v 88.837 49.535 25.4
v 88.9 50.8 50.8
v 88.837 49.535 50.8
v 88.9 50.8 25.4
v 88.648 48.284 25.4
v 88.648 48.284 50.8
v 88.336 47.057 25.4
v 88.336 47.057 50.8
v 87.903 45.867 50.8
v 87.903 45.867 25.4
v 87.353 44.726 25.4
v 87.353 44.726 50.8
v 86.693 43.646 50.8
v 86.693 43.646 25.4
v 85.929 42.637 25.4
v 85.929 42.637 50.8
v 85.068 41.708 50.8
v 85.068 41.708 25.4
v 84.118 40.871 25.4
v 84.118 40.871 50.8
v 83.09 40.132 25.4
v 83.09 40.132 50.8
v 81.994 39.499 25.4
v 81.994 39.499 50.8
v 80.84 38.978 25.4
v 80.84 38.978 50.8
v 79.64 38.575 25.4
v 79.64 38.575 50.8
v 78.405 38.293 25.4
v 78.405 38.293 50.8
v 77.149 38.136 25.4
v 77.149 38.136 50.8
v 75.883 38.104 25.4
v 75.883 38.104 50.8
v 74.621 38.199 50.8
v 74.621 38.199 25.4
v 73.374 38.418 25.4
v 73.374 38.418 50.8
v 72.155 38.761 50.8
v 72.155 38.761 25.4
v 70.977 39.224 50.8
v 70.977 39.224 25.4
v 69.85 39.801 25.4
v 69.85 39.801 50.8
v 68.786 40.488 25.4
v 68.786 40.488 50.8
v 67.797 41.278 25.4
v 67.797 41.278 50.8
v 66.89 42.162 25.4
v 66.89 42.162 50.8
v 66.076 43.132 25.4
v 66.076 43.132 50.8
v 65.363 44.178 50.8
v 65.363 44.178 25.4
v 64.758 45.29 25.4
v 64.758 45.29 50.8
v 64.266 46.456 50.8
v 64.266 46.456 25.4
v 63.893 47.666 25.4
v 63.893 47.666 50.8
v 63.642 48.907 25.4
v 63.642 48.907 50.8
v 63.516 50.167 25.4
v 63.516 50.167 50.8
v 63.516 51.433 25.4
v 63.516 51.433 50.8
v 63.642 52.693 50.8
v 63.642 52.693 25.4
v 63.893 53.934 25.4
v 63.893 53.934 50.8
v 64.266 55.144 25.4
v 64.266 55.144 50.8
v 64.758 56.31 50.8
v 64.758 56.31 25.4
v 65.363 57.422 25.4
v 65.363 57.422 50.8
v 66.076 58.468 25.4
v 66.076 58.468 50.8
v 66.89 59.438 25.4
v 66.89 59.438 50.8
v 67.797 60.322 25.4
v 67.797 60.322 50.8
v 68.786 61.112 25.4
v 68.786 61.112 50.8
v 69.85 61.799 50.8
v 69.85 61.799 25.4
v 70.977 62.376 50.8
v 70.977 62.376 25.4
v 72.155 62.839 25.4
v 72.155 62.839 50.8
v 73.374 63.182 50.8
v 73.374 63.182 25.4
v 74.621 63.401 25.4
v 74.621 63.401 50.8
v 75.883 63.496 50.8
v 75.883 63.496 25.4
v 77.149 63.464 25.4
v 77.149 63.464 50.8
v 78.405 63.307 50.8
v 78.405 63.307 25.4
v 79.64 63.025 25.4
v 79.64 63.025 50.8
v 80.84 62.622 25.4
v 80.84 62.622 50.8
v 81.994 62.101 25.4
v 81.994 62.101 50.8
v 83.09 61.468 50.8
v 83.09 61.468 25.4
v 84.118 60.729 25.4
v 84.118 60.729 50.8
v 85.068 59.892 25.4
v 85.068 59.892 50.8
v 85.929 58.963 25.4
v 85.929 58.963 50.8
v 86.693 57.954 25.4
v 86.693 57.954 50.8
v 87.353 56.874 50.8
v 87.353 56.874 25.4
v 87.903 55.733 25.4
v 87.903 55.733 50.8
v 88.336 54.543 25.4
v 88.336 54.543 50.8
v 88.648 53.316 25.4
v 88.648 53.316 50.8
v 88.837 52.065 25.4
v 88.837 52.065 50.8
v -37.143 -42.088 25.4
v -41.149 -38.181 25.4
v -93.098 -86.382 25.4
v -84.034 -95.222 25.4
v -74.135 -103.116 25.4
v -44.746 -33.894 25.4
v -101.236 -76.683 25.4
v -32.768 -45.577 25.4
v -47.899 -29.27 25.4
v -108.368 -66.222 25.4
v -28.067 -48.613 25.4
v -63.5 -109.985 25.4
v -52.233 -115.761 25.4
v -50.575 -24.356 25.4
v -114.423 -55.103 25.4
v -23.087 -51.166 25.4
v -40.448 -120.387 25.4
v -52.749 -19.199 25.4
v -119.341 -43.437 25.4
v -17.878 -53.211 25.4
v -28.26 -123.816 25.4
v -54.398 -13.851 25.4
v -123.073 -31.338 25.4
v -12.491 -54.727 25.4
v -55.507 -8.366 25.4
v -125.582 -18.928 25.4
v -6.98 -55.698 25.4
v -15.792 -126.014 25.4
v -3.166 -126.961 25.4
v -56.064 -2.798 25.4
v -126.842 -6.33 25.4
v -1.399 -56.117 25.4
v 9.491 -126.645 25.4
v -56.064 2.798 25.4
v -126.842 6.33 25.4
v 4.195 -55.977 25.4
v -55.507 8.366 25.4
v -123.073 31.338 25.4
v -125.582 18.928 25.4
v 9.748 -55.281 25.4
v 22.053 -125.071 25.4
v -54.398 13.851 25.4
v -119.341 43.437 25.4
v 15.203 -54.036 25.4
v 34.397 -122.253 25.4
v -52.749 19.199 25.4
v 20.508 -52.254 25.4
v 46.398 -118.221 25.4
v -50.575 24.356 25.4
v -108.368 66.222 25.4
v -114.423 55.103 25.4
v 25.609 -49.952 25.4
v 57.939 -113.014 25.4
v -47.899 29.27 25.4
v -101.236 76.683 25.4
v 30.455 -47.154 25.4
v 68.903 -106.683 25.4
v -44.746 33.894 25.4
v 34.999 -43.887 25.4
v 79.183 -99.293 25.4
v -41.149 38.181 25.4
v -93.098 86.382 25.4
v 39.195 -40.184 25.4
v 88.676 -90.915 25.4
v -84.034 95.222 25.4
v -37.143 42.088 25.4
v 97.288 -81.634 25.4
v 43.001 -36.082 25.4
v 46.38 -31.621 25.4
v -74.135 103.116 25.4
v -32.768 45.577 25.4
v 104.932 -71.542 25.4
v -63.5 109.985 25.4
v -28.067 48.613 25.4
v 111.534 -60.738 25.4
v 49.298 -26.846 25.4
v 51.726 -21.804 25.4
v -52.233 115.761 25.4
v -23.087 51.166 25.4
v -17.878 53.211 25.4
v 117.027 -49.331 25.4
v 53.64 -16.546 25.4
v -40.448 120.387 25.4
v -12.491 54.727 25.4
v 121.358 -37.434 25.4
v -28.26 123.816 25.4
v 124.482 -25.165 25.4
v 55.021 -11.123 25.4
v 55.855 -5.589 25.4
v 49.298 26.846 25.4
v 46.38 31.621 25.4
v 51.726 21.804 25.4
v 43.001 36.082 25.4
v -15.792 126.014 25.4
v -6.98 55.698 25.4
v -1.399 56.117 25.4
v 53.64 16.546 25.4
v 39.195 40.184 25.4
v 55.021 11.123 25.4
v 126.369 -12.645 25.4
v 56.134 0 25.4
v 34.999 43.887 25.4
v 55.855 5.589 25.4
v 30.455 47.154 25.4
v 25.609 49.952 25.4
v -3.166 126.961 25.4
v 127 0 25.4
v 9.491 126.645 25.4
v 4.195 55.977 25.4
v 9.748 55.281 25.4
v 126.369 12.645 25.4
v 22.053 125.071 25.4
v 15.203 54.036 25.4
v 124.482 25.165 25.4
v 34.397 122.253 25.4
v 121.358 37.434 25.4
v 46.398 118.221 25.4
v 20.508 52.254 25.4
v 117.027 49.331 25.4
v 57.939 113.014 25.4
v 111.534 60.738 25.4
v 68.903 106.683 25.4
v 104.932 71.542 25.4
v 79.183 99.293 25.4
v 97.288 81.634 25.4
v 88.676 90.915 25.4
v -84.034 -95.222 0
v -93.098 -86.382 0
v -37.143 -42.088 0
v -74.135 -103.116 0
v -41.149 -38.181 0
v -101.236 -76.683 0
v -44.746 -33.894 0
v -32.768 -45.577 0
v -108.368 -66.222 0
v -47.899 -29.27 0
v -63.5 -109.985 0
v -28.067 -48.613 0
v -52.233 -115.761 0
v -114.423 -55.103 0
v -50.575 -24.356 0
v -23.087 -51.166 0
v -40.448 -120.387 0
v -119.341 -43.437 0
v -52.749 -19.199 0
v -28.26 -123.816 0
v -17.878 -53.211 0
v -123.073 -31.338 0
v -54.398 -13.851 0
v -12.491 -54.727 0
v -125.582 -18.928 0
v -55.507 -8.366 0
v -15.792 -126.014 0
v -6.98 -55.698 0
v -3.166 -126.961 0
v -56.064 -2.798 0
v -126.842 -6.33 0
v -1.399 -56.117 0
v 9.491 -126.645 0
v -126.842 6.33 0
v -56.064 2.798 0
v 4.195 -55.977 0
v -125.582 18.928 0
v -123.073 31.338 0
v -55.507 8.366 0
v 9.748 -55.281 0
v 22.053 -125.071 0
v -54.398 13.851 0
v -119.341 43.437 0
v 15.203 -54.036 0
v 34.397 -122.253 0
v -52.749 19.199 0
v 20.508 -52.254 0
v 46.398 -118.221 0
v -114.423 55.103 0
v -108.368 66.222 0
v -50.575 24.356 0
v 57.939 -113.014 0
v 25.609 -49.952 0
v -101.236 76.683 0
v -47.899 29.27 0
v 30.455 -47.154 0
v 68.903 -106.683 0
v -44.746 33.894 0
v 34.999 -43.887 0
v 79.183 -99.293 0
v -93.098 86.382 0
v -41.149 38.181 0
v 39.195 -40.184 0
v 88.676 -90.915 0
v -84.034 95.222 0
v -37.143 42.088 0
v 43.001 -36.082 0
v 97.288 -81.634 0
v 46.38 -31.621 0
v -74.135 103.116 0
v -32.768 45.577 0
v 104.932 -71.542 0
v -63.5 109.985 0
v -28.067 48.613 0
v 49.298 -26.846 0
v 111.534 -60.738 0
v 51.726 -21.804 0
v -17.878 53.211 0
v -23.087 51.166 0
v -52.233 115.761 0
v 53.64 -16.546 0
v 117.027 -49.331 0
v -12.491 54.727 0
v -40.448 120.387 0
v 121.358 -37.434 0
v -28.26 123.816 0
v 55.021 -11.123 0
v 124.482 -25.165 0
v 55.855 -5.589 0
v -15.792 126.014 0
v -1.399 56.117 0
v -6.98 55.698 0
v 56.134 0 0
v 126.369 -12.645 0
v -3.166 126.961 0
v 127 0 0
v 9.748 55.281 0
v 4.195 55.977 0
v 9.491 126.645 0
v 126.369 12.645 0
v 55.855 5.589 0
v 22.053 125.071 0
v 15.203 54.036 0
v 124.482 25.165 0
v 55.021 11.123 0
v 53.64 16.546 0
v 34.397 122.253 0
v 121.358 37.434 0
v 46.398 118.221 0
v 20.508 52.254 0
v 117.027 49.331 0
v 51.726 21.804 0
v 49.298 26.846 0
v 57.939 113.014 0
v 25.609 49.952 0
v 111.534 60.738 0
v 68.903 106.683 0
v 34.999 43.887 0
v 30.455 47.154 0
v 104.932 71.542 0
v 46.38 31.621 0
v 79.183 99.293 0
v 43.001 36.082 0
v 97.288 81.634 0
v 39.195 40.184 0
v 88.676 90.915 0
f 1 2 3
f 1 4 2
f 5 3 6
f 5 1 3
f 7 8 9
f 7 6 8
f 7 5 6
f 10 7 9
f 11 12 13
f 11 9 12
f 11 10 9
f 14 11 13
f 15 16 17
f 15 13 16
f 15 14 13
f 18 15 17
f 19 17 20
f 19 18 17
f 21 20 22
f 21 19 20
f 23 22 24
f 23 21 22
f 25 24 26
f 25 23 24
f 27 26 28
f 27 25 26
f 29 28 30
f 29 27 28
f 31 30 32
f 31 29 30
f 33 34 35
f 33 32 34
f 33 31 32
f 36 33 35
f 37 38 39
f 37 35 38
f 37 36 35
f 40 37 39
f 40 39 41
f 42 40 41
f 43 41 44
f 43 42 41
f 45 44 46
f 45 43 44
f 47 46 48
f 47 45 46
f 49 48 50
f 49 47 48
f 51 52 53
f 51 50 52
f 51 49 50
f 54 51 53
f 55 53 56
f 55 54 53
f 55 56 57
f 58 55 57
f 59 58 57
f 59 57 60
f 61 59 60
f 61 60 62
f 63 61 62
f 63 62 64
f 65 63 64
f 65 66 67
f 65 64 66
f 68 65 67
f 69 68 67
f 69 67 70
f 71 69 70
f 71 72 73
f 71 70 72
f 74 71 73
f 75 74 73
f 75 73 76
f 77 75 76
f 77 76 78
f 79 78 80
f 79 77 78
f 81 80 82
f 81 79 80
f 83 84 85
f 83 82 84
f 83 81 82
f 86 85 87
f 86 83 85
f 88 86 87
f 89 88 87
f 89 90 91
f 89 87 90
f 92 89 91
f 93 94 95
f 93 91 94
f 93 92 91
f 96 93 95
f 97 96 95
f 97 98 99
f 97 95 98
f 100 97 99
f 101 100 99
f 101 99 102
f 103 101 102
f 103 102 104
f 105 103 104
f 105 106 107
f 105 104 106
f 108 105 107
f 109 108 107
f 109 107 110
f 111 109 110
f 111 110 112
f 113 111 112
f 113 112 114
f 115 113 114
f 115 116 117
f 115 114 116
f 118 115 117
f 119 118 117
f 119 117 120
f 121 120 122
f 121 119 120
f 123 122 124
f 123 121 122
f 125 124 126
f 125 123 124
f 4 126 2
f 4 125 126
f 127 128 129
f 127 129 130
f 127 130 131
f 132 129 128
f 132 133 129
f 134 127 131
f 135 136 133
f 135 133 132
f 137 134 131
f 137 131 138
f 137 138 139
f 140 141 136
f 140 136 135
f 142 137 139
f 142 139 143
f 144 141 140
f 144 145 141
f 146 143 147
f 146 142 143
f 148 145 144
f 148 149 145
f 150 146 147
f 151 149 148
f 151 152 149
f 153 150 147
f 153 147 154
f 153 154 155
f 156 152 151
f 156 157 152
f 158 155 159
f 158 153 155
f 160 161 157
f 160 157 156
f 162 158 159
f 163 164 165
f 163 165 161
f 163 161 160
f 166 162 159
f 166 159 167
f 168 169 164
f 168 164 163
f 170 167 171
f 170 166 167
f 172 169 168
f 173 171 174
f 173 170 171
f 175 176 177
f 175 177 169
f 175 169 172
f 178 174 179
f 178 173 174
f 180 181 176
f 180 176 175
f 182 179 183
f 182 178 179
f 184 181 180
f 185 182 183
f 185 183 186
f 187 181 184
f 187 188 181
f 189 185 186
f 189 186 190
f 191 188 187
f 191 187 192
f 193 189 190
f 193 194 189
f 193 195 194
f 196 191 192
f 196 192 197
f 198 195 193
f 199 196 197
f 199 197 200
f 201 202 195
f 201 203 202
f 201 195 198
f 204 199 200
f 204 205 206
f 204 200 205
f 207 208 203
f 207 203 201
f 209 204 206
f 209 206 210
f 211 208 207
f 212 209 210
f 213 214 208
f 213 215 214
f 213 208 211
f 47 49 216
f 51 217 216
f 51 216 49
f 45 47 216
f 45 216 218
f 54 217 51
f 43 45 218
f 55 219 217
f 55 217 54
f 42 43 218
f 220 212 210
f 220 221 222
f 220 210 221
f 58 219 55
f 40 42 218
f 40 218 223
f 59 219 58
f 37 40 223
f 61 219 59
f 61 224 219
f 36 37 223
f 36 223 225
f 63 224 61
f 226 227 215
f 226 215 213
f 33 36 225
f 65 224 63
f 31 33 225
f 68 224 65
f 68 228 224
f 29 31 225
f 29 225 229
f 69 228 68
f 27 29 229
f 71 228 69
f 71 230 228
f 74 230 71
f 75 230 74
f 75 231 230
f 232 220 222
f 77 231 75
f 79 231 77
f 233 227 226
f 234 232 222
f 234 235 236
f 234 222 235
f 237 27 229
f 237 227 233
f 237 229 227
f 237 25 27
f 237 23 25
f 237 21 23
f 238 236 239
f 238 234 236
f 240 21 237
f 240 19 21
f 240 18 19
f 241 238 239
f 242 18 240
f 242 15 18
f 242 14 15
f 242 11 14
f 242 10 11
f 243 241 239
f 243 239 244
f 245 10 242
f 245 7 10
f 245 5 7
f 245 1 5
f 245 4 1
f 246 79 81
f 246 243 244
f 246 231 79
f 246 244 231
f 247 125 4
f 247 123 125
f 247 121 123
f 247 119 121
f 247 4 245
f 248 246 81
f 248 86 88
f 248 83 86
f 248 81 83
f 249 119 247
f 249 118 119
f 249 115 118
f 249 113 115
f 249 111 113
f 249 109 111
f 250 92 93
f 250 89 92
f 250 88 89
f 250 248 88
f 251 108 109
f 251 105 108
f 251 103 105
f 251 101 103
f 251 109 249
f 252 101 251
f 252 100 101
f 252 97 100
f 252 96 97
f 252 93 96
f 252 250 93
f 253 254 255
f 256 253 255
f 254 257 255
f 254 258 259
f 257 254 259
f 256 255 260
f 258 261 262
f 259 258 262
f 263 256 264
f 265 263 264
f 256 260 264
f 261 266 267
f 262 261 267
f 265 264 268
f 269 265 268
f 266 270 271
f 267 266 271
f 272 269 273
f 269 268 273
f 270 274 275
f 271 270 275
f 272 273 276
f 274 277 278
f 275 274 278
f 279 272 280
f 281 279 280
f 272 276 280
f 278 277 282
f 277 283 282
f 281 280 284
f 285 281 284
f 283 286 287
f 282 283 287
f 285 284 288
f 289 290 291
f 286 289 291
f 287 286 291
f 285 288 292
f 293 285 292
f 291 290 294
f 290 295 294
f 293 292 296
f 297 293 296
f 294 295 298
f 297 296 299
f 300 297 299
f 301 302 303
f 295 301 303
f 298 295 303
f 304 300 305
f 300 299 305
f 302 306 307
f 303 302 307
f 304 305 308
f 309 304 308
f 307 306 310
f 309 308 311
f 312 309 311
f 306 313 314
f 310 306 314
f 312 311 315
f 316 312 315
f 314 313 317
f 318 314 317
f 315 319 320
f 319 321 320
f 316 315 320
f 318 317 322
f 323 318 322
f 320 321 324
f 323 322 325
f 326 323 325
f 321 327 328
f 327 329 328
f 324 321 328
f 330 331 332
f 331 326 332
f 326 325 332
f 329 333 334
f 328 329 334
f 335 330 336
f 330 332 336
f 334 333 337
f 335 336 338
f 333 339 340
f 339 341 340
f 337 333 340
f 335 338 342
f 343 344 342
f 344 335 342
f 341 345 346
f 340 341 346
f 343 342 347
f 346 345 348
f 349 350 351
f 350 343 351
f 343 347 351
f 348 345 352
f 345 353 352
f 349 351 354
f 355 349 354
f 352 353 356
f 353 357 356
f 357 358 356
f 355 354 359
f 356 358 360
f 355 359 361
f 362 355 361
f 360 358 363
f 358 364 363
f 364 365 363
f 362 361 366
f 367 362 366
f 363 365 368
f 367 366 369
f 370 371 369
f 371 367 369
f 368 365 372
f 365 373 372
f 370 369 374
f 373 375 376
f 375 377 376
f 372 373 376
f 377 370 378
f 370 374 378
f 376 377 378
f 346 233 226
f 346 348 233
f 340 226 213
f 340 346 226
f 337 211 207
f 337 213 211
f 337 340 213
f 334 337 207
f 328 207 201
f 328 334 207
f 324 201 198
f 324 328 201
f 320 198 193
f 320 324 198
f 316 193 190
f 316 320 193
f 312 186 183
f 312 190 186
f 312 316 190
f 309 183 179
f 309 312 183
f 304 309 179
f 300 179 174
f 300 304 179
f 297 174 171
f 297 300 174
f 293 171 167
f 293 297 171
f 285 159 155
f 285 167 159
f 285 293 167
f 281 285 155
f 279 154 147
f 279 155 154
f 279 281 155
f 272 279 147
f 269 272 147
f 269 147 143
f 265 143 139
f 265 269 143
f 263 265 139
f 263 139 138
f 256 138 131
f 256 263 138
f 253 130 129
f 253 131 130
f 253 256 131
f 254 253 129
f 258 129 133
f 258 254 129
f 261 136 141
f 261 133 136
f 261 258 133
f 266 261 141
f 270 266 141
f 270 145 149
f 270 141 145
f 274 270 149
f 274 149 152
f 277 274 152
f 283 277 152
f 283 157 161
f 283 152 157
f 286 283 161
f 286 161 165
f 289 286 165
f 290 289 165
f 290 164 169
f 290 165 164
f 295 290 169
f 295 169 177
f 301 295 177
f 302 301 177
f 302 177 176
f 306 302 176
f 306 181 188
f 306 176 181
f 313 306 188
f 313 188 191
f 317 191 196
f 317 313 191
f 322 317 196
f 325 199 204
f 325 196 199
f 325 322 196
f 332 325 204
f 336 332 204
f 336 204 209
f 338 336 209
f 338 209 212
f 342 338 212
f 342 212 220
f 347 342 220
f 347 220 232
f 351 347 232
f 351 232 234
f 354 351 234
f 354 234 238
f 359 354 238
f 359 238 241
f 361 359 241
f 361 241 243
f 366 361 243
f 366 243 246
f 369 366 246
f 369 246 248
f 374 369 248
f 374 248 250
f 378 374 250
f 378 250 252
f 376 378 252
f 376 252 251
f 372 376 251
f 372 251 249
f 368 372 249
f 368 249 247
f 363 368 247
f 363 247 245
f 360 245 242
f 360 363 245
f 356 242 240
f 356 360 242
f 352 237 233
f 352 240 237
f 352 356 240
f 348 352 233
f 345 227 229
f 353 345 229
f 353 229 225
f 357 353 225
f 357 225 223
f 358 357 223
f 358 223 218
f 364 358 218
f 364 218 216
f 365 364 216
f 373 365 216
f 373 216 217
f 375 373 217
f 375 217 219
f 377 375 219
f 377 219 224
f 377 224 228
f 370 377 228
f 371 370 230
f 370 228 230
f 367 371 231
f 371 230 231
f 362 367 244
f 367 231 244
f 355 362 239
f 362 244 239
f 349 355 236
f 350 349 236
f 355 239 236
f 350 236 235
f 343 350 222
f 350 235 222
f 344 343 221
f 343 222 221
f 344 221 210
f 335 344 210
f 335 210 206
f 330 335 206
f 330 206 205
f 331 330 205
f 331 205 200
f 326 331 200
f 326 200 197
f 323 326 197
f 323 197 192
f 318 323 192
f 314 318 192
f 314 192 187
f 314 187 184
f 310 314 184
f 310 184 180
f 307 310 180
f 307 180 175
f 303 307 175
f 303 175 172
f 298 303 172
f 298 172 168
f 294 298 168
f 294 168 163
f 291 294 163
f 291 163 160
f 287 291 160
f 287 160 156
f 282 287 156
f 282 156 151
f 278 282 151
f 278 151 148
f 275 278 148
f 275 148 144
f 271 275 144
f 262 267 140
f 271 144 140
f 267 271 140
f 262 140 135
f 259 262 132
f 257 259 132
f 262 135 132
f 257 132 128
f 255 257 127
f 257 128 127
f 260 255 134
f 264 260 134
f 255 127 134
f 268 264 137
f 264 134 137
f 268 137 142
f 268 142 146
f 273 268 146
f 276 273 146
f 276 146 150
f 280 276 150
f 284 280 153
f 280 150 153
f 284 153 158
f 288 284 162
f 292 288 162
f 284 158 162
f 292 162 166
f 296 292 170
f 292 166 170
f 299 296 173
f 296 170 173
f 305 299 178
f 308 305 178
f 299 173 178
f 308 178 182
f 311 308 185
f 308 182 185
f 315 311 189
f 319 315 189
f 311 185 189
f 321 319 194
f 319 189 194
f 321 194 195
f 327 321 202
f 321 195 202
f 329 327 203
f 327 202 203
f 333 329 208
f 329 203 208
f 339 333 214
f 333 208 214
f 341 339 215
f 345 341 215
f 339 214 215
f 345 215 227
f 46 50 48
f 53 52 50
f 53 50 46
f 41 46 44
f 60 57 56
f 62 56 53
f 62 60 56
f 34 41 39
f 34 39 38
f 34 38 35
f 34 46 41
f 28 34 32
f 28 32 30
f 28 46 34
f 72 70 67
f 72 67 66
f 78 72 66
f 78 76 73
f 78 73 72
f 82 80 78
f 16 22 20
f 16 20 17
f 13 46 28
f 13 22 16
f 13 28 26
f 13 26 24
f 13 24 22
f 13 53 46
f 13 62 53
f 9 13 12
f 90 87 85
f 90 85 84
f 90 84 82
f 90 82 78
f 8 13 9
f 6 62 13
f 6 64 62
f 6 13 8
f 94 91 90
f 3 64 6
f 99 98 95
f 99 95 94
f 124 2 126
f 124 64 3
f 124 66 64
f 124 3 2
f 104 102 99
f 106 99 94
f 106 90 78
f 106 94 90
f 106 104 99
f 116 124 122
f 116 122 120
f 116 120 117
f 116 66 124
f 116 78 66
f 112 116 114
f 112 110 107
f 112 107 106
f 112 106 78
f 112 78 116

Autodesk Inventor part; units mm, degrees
ref_plane "YZ Plane" through (0, 0, 0) normal (1, 0, 0) x (0, 1, 0)
ref_plane "XZ Plane" through (0, 0, 0) normal (0, 1, 0) x (-1, 0, 0)
ref_plane "XY Plane" through (0, 0, 0) normal (0, 0, 1) x (1, 0, 0)
sketch "Sketch1" plane through (0, 0, 0) normal (0, 0, 1) x (1, 0, 0)
  circle A0 centre (0, 0) radius 127
  dimension "d0" = 254
extrude "Extrusion1" add sketch "Sketch1" along normal blind 25.4
sketch "Sketch2" plane through (0, 0, 25.4) normal (0, 0, 1) x (1, 0, 0)
  circle A0 centre (0, 0) radius 56.134
  dimension "d4" = 112.268
extrude "Extrusion2" cut sketch "Sketch2" against normal blind 25.4
sketch "Sketch3" plane through (0, 0, 25.4) normal (0, 0, 1) x (1, 0, 0)
  circle A0 centre (76.2, 50.8) radius 12.7
  point P0 (0, 0)
  dimension "d7" = 25.4
  dimension "d8" = 50.8
  dimension "d9" = 76.2
extrude "Extrusion3" add sketch "Sketch3" along normal blind 25.4
properties part number "Manivela"
